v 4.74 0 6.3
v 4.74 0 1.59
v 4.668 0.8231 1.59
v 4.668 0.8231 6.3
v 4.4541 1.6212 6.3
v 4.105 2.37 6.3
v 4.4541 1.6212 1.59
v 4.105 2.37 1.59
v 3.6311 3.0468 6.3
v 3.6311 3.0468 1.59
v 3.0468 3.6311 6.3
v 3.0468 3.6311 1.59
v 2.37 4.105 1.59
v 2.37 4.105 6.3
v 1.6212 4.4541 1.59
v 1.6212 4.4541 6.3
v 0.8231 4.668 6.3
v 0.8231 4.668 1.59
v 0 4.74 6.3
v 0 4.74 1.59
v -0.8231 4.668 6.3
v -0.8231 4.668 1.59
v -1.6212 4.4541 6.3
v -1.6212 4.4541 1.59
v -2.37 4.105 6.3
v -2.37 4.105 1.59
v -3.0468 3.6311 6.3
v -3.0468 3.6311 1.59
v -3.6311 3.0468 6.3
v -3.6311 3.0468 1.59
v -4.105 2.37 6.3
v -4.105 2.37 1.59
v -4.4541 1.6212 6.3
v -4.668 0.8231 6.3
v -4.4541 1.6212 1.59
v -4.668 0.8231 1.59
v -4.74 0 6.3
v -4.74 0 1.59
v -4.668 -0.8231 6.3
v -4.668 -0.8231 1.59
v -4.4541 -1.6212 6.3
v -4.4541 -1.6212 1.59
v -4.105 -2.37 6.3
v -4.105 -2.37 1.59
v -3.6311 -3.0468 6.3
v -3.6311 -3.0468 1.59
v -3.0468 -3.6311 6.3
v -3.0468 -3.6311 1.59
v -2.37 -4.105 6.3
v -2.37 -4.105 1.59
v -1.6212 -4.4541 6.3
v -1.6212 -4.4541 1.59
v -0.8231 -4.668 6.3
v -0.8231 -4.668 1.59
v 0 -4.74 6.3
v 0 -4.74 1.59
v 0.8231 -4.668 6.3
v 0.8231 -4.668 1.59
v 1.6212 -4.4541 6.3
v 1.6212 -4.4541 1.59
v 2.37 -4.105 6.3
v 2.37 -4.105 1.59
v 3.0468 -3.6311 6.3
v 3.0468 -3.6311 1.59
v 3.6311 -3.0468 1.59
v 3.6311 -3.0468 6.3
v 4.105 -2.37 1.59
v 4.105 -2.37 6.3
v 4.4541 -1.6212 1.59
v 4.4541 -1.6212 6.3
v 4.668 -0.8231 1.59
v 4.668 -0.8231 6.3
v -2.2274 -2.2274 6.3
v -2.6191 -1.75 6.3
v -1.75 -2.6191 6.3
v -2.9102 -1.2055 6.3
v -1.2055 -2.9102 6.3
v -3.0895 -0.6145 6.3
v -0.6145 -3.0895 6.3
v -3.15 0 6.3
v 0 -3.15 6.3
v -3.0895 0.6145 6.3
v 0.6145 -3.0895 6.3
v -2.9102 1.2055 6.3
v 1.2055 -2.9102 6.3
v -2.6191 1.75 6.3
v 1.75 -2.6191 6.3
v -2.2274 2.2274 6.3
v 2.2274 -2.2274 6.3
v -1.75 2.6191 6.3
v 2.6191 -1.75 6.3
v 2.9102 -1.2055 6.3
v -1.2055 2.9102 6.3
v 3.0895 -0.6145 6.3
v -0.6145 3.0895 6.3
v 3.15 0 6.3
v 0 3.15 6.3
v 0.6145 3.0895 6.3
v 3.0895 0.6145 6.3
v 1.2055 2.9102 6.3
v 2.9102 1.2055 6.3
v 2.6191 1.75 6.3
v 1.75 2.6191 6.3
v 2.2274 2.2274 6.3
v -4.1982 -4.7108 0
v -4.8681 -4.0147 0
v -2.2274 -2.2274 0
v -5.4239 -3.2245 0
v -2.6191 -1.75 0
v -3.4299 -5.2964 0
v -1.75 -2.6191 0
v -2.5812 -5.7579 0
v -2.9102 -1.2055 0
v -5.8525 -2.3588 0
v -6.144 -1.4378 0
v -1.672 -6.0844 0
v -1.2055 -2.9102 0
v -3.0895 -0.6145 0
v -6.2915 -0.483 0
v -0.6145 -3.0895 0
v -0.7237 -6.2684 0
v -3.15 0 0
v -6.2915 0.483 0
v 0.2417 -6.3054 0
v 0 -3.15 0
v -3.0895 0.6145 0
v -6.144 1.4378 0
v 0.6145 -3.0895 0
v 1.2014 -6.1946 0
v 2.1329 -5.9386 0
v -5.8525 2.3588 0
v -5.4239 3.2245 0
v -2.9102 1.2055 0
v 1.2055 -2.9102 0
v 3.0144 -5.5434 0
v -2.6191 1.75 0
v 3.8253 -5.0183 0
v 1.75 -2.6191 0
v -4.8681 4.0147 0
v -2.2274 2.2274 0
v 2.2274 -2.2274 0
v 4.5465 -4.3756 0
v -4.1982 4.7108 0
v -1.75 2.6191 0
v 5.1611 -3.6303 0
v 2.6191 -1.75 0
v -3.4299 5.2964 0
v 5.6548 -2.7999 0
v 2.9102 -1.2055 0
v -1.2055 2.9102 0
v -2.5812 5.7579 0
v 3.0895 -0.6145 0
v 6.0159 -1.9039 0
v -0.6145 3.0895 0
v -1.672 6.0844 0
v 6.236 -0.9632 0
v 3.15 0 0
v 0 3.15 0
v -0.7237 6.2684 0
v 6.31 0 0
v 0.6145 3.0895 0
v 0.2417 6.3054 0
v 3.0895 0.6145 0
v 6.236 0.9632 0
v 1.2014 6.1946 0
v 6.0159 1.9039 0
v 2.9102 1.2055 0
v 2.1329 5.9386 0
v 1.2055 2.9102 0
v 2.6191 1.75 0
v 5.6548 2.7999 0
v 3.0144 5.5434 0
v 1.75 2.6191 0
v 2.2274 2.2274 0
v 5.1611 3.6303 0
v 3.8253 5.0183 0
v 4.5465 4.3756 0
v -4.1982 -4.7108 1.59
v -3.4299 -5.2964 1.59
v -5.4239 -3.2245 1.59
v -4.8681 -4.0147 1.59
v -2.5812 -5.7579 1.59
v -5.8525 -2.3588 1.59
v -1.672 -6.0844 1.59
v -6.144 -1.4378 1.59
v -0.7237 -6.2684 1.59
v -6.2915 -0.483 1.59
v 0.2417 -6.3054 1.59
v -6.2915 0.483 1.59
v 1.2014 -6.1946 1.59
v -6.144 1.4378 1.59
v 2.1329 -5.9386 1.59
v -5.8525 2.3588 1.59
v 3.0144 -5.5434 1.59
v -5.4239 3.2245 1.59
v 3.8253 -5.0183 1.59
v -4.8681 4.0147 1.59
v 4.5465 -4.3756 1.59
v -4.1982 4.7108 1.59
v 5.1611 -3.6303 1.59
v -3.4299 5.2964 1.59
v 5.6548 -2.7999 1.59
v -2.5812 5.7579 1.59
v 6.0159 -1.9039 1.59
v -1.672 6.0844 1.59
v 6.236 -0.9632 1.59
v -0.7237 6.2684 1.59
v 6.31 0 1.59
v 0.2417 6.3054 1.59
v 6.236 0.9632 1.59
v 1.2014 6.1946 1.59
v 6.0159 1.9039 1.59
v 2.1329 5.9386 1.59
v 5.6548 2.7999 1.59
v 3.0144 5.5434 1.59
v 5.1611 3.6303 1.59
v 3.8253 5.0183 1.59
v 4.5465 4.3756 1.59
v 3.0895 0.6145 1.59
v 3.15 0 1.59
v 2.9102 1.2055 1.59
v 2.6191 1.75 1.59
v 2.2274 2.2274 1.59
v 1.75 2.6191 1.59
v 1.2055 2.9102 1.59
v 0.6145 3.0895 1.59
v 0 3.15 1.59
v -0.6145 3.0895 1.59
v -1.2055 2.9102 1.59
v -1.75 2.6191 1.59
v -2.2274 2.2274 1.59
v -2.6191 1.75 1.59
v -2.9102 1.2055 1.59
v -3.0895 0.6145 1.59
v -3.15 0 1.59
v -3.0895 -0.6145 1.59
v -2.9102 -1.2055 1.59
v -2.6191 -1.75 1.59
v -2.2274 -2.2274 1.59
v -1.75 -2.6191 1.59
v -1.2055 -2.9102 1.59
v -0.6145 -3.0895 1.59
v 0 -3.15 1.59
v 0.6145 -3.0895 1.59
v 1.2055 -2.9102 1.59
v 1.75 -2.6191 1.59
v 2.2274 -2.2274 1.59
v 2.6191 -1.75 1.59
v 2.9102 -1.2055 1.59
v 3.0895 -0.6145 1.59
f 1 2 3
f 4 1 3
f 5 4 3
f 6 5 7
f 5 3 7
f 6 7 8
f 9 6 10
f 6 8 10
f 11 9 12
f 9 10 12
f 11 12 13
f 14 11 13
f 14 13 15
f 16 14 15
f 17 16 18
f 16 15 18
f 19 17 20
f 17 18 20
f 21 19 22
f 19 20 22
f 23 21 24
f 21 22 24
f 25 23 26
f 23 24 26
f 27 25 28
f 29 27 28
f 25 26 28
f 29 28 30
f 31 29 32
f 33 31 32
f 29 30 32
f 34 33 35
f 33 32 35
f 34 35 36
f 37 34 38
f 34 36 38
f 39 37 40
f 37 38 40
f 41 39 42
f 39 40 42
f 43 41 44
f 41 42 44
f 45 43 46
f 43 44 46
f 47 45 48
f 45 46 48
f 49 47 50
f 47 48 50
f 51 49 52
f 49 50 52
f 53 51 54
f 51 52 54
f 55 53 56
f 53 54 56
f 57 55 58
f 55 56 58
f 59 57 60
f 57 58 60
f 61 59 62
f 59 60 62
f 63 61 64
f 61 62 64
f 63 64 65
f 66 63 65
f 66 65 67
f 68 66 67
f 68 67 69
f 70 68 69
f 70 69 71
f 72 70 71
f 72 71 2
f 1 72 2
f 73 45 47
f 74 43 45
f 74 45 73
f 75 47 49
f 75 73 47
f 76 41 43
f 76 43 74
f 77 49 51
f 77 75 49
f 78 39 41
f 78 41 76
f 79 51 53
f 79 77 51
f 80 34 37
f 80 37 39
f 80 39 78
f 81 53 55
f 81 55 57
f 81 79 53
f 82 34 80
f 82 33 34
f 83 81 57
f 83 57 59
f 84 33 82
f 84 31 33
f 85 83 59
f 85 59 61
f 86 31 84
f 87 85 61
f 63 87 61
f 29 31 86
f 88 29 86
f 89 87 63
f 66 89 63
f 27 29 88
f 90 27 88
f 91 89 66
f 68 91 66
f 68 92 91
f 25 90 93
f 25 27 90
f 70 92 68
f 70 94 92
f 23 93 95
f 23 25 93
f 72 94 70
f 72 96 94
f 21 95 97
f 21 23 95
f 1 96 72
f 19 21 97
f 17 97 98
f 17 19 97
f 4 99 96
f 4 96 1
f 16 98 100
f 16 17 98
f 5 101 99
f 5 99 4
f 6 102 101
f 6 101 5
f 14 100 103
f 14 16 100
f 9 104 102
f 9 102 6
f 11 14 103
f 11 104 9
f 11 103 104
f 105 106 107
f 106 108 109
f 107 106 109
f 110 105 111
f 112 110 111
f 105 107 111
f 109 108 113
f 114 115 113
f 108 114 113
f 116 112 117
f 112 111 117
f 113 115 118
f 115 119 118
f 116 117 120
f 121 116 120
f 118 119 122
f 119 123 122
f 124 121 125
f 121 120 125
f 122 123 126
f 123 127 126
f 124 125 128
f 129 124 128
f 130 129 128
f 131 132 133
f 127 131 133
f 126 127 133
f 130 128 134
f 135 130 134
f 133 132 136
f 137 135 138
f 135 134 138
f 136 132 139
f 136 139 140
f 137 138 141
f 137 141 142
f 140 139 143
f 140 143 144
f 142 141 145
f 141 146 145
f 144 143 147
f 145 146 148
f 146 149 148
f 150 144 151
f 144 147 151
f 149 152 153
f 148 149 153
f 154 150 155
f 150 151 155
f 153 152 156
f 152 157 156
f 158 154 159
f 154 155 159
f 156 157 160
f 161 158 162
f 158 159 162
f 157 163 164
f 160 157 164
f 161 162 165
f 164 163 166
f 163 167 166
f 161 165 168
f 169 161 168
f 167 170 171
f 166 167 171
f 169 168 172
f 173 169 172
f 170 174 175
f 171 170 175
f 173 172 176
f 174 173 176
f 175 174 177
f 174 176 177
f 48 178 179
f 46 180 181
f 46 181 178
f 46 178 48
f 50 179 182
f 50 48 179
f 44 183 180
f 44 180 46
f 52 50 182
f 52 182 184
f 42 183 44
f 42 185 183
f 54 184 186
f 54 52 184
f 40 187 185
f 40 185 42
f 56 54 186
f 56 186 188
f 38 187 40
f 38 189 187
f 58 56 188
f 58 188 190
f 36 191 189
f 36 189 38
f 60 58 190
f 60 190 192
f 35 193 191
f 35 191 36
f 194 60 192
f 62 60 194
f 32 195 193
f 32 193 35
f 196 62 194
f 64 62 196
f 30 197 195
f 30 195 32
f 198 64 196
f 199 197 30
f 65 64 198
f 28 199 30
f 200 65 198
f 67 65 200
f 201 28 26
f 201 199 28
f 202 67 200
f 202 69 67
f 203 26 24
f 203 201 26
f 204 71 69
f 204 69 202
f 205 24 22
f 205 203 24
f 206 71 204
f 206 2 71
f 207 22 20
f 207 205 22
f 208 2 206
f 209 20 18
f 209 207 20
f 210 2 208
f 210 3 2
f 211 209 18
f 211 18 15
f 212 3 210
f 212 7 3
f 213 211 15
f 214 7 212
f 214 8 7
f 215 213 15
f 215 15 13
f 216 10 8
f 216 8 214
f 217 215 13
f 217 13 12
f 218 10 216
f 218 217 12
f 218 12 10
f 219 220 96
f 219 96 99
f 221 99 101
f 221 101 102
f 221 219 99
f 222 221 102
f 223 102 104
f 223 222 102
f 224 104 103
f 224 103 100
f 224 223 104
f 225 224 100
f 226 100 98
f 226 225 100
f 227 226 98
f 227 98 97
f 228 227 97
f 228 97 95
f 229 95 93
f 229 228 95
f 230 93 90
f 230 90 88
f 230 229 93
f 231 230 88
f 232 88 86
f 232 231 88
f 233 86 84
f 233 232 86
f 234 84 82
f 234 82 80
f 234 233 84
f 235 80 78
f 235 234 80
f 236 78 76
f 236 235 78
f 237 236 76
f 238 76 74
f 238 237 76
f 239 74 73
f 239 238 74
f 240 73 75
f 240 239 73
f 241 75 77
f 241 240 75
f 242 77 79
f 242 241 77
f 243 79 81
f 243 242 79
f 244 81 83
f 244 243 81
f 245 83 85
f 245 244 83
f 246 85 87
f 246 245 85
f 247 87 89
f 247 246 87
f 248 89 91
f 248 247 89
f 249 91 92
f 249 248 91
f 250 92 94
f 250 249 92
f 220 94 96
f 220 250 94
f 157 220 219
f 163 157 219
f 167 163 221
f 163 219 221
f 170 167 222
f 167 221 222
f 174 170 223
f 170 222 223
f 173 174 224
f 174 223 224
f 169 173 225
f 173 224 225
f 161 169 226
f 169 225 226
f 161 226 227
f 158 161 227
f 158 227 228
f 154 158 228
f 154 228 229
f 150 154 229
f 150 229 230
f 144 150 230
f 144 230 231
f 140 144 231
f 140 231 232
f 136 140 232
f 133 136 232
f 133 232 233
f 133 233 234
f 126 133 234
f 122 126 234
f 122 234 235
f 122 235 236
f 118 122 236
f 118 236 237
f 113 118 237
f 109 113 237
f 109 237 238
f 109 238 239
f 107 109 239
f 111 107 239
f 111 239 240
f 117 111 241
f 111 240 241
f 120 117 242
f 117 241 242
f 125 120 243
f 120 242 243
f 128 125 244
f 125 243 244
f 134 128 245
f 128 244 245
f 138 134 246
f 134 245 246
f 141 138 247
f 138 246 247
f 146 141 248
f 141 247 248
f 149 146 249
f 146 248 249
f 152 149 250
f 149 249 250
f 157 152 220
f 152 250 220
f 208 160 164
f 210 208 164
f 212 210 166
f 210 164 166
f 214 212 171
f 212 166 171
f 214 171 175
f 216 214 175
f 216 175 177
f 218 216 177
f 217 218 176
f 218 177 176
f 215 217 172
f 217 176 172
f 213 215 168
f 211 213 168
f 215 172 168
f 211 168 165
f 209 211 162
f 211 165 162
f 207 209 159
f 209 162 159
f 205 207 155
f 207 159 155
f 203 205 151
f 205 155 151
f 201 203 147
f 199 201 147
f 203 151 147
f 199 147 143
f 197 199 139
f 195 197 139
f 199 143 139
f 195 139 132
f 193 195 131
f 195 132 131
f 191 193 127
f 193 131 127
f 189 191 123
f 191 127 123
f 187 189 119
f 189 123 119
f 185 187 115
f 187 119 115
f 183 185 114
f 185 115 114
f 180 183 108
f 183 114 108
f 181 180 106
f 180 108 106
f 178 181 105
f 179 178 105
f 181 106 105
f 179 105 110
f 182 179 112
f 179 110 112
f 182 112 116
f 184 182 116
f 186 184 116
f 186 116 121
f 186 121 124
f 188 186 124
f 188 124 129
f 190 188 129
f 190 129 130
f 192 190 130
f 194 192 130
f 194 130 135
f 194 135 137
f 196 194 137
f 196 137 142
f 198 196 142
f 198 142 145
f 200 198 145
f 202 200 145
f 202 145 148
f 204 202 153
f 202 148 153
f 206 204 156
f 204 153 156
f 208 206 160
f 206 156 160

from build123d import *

# Parameters (mm, degrees)
F0_R     = 6.31
F1_DEPTH = 1.59
F2_R     = 3.15
F3_DEPTH = 1.591
F4_R     = 4.74
F4_R_2   = 3.15
F5_DEPTH = 4.71


with BuildPart() as f1:
    # F0 (on Top) → F1 (new body)
    with BuildSketch(Plane.XY):
        Circle(F0_R)
    extrude(amount=F1_DEPTH)

    # F2 (on face) → F3 (cut, through all)
    with BuildSketch(Plane.XY.offset(1.59)):
        Circle(F2_R)
    extrude(amount=-F3_DEPTH, mode=Mode.SUBTRACT)

    # F4 (on face) → F5 (join)
    with BuildSketch(Plane.XY.offset(1.59)):
        Circle(F4_R)
        Circle(F4_R_2, mode=Mode.SUBTRACT)
    extrude(amount=F5_DEPTH)


solid = f1.part
